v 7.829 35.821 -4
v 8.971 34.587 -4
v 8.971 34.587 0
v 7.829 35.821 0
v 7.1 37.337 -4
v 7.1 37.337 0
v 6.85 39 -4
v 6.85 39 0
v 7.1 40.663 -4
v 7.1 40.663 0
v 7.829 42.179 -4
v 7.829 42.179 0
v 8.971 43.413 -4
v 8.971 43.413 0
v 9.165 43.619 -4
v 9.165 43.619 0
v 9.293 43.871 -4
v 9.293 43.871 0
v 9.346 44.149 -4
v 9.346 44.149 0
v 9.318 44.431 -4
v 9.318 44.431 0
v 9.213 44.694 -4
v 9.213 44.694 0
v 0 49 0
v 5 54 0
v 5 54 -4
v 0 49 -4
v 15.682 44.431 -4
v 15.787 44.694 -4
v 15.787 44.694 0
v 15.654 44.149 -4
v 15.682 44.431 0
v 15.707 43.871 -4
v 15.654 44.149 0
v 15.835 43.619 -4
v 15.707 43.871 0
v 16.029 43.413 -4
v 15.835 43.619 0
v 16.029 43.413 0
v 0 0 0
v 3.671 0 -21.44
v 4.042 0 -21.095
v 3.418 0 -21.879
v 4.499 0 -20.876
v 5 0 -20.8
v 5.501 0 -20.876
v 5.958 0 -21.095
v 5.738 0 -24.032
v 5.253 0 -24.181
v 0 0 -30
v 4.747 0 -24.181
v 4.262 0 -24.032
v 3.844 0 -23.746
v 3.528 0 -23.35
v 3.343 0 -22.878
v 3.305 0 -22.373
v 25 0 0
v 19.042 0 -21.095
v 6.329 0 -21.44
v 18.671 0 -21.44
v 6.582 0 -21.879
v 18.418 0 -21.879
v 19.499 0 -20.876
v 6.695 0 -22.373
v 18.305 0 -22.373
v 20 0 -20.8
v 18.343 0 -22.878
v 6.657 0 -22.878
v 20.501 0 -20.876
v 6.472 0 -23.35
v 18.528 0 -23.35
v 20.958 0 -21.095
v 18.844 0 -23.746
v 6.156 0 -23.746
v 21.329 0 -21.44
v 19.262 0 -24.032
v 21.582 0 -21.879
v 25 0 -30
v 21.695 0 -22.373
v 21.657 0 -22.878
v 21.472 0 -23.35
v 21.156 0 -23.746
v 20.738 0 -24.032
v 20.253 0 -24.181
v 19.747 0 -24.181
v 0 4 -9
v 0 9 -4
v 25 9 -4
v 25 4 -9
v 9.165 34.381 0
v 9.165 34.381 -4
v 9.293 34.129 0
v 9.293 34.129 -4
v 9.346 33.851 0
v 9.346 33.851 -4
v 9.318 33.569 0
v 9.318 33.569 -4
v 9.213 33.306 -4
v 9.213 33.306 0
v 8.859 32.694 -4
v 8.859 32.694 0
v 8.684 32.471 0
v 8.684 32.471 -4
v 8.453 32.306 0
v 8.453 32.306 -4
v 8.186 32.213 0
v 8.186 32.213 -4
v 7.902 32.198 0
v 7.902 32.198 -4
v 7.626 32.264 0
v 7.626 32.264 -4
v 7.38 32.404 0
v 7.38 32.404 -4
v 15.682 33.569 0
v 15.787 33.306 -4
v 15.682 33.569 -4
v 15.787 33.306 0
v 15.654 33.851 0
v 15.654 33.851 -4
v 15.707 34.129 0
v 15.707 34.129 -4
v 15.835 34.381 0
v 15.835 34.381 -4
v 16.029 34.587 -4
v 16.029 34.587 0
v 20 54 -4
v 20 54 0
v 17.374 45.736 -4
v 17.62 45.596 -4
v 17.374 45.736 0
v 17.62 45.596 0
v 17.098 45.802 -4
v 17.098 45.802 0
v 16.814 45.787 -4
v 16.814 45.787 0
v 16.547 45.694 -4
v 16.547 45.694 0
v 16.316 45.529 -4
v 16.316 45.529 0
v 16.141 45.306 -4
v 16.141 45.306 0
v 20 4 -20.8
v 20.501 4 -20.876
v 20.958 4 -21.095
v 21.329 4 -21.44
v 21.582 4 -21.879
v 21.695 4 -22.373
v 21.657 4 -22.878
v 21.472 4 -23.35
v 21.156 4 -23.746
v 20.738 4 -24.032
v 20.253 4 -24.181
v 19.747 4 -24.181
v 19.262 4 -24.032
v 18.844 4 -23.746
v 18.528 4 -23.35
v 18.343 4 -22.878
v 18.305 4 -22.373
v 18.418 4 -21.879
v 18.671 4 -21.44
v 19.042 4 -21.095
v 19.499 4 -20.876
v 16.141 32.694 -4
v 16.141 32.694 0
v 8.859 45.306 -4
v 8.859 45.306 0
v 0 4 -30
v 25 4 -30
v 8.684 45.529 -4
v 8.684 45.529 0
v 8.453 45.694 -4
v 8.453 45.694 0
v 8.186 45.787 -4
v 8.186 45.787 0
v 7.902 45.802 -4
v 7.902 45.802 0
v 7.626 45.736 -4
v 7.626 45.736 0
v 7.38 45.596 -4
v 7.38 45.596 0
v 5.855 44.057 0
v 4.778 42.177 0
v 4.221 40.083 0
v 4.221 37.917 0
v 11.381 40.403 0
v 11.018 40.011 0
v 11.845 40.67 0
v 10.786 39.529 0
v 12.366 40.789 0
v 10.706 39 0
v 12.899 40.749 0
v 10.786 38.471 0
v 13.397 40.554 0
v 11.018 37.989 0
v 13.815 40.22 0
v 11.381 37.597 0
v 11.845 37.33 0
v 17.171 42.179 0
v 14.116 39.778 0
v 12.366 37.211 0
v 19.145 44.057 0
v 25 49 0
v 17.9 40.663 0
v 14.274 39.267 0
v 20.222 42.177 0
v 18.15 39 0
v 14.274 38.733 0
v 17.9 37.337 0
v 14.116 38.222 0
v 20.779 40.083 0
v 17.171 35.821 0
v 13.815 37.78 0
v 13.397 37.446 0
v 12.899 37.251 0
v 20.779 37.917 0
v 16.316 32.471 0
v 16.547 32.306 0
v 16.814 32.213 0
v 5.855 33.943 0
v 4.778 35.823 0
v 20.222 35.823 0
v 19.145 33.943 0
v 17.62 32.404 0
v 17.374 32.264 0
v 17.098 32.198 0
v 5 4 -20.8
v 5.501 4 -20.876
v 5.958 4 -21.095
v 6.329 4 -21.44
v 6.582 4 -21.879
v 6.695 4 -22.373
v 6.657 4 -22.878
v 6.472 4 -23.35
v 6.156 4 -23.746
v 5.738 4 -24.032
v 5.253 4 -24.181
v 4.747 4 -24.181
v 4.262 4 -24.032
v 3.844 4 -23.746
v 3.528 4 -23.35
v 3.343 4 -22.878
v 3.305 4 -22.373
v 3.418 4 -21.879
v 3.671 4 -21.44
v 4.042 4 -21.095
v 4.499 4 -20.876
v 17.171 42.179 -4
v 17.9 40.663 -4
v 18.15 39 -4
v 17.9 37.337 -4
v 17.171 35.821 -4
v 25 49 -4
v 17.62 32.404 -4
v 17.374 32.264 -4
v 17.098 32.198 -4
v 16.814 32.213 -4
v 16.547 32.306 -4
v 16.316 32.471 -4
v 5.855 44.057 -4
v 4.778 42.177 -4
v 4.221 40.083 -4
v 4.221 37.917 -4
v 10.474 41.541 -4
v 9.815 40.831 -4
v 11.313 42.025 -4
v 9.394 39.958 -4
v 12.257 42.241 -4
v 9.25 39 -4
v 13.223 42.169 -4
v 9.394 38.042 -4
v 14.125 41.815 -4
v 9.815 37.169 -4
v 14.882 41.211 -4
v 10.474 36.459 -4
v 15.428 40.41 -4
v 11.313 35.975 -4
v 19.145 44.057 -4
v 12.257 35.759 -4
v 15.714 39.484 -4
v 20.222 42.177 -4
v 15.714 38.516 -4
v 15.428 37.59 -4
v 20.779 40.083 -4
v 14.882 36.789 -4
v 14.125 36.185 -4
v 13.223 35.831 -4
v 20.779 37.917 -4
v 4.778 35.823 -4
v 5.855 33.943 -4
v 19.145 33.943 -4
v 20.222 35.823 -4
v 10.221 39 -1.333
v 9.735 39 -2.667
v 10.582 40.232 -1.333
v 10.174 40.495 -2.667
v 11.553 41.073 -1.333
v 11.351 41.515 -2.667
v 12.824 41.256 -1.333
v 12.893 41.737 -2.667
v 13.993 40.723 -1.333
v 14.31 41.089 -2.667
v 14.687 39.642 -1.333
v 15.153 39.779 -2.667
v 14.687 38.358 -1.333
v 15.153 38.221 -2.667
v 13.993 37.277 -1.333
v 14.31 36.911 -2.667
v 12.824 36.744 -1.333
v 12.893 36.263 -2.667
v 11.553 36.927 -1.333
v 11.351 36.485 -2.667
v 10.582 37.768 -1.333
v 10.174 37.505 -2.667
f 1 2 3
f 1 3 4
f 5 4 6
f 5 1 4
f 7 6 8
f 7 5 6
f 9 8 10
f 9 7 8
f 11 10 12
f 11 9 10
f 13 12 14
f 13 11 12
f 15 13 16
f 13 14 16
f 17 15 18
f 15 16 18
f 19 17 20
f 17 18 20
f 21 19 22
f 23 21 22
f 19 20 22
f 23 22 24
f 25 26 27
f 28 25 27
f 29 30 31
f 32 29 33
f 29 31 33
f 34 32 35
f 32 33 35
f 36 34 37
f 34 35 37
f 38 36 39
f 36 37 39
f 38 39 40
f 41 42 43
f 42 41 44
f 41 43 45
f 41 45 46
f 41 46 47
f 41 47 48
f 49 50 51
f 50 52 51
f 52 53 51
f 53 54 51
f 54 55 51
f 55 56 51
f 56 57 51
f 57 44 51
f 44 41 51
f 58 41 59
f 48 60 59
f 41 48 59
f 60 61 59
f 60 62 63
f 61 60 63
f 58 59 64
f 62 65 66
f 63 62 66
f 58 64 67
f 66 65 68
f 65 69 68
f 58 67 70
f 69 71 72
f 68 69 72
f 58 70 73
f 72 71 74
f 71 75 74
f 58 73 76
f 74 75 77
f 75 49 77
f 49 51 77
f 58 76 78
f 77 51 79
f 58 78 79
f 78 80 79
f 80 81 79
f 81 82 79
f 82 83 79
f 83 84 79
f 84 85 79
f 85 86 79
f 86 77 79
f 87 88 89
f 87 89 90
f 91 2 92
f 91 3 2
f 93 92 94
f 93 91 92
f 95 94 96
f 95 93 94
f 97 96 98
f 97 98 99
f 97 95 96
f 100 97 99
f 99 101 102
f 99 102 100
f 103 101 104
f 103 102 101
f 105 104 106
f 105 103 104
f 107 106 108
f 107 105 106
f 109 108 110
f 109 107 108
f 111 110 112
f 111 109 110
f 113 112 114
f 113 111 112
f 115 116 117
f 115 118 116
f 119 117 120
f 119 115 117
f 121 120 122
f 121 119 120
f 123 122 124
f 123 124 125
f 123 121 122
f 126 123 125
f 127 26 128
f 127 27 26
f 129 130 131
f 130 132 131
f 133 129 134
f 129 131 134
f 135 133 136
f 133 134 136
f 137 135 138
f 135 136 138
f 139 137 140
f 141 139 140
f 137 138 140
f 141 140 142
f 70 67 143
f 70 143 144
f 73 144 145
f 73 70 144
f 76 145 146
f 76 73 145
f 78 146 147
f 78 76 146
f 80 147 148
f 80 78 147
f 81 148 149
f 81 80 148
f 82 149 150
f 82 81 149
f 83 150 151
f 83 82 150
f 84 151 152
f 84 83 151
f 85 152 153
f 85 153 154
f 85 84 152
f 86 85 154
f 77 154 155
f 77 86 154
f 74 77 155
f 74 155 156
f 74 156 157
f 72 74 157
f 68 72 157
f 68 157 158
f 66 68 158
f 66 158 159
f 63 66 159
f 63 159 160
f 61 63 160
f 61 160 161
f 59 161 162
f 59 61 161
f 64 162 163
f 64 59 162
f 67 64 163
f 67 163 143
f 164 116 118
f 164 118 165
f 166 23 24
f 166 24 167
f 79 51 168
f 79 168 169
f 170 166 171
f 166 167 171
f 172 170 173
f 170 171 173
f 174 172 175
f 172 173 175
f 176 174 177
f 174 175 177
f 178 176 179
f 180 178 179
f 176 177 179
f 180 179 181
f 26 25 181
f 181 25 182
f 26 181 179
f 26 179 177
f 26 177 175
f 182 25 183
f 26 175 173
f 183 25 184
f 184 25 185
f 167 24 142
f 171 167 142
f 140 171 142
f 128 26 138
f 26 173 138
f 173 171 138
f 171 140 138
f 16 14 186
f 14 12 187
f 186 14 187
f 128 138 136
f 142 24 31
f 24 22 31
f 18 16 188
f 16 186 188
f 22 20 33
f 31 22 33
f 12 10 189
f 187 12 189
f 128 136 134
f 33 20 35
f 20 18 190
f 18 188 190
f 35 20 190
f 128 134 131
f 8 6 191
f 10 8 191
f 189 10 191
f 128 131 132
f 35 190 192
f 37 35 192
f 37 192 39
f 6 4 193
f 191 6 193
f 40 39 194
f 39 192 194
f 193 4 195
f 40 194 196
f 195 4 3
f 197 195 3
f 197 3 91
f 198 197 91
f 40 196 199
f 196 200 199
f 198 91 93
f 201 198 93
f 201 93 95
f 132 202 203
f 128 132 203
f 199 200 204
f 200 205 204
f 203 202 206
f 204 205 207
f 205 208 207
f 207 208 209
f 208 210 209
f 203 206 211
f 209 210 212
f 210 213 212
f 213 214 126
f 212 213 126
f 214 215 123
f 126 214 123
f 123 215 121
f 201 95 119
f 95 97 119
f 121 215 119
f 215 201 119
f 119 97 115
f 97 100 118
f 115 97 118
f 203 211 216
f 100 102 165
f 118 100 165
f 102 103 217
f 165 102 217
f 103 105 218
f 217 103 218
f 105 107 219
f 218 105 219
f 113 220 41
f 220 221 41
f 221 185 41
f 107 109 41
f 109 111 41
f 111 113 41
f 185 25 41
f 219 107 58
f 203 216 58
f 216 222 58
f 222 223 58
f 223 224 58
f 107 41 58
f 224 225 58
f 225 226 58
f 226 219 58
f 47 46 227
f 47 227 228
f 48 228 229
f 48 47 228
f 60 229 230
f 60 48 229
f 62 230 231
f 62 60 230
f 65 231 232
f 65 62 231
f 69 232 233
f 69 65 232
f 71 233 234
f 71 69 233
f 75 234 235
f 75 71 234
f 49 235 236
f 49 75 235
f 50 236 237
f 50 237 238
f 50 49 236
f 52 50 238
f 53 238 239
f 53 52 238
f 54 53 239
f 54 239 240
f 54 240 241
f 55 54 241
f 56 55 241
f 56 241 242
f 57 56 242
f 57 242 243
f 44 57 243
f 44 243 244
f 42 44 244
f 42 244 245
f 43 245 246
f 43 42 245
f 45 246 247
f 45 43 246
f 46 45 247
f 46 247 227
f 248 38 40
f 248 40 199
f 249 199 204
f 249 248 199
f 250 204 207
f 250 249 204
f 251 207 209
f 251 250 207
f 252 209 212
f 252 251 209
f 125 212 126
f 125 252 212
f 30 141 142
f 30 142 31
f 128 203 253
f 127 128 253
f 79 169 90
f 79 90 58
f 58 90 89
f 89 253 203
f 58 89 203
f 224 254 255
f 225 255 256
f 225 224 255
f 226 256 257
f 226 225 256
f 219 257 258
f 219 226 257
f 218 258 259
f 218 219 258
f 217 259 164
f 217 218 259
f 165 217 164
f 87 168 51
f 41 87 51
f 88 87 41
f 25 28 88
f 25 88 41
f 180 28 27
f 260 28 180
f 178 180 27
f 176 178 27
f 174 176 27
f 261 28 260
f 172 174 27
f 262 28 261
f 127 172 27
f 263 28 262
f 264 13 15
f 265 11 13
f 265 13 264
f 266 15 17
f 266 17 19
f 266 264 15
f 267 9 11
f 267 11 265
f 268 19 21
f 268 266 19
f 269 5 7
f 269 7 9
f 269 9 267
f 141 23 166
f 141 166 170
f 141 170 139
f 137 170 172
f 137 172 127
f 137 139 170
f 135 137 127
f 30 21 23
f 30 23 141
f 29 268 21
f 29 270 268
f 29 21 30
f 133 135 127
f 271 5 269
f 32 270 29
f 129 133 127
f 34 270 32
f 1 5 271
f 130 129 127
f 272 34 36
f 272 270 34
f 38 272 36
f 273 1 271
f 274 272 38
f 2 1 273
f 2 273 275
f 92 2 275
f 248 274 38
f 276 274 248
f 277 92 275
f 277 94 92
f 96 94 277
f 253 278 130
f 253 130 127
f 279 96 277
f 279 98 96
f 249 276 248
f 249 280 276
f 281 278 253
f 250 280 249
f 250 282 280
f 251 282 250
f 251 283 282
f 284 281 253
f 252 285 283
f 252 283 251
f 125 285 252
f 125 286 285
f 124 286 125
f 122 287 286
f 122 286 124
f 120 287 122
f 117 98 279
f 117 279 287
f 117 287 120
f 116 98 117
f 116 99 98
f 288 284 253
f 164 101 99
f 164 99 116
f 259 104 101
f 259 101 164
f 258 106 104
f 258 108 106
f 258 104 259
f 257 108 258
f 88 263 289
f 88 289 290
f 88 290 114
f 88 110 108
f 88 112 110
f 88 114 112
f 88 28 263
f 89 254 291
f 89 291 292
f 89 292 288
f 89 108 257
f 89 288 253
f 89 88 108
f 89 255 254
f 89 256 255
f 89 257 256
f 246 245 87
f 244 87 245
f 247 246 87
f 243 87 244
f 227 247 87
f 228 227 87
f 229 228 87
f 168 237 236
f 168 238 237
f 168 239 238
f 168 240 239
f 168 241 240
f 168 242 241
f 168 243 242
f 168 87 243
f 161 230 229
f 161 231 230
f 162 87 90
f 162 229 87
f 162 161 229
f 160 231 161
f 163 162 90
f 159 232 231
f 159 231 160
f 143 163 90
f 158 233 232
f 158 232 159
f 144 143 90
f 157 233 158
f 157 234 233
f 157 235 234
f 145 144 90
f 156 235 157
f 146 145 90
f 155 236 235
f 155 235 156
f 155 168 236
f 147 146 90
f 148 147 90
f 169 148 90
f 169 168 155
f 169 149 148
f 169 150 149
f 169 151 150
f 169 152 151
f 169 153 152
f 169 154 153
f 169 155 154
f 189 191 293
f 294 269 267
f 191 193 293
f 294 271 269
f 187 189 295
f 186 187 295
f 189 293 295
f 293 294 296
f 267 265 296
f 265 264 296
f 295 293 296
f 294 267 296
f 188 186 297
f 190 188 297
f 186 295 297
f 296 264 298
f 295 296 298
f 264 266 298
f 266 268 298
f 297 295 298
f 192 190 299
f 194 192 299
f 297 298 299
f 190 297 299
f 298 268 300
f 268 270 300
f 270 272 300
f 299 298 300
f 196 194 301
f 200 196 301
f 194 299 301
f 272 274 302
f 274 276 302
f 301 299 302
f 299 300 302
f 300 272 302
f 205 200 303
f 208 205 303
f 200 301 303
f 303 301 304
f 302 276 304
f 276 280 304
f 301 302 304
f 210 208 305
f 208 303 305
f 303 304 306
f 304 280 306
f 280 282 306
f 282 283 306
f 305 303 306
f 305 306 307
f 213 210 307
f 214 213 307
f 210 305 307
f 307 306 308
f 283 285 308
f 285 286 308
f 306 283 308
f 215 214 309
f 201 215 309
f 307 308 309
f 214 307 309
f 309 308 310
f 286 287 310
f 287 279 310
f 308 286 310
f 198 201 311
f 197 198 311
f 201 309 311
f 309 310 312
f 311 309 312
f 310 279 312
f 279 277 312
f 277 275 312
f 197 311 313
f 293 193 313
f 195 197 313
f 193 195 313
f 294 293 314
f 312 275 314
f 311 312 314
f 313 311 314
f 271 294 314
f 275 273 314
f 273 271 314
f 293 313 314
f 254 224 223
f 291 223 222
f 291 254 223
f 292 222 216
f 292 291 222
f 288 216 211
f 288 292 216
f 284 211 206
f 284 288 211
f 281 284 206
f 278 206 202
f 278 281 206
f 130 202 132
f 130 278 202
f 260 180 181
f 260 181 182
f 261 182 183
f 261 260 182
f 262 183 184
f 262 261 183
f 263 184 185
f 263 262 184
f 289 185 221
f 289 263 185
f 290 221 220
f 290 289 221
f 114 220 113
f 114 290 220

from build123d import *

# Parameters (mm, degrees)
SKETCH_2_W          = 25
SKETCH_2_H          = 30
SKETCH_2_R          = 1.7
EXTRUDE_1_DEPTH     = 4
SKETCH_3_W          = 25
SKETCH_3_H          = 4
EXTRUDE_2_DEPTH     = 50
SKETCH_7_R          = 3.25
CUT_EXTRUDE_3_DEPTH = 4
CUT_EXTRUDE_3_DRAFT = -20
CUT_EXTRUDE_4_DEPTH = 65.93843238
EXTRUDE_3_DEPTH     = 25
CHAMFER_1_SIZE      = 5
FILLET_1_R          = 1


with BuildPart() as part:
    # 草图2 → 凸台-拉伸1 (new body)
    with BuildSketch(Plane(origin=(0, 0, 0), x_dir=(1, 0, 0), z_dir=(0, 1, 0))):
        with Locations((12.5, 15)):
            Rectangle(SKETCH_2_W, SKETCH_2_H)
        with Locations(Location((5, 22.5, 0), (0, 0, 270))):
            Circle(SKETCH_2_R, mode=Mode.SUBTRACT)
        with Locations(Location((20, 22.5, 0), (0, 0, 270))):
            Circle(SKETCH_2_R, mode=Mode.SUBTRACT)
    extrude(amount=EXTRUDE_1_DEPTH)

    # 草图3 → 凸台-拉伸2 (add)
    with BuildSketch(Plane(origin=(0, 4, 0), x_dir=(1, 0, 0), z_dir=(0, 1, 0))):
        with Locations((12.5, 2)):
            Rectangle(SKETCH_3_W, SKETCH_3_H)
    extrude(amount=EXTRUDE_2_DEPTH)


with BuildPart() as cut_extrude_3_tool:
    # 草图7 → 切除-拉伸3 (with draft: the straight prism first)
    with BuildSketch(Plane(origin=(0, 0, -4), x_dir=(-1, 0, 0), z_dir=(0, 0, -1))):
        with Locations((-12.5, 39)):
            Circle(SKETCH_7_R)
    extrude(amount=-CUT_EXTRUDE_3_DEPTH)
    # 切除-拉伸3: the draft: its side faces are tilted about the plane it starts from
    cut_extrude_3_sides = [cut_extrude_3_tool.faces().sort_by_distance(p)[0] for p in [
        (15.75, 39, -2),
    ]]
    draft(cut_extrude_3_sides, Plane(origin=(0, 0, -4), x_dir=(-1, 0, 0), z_dir=(0, 0, -1)), CUT_EXTRUDE_3_DRAFT)


with BuildPart() as part_1:
    add(part.part)

    # 切除-拉伸3: cut by cut_extrude_3_tool
    add(cut_extrude_3_tool.part, mode=Mode.SUBTRACT)

    # 草图6 → 切除-拉伸4 (cut, through all)
    with BuildSketch(Plane(origin=(0, 0, -4), x_dir=(-1, 0, 0), z_dir=(0, 0, -1))):
        with BuildLine():
            Line((-16.675, 46.231312122), (-15.325, 43.893043531))
            ThreePointArc((-15.325, 43.893043531), (-18.15, 39), (-15.325, 34.106956469))
            Line((-15.325, 34.106956469), (-16.675, 31.768687878))
            ThreePointArc((-16.675, 31.768687878), (-20.85, 39), (-16.675, 46.231312122))
        make_face()
        with BuildLine():
            Line((-9.675, 43.893043531), (-8.325, 46.231312122))
            ThreePointArc((-8.325, 46.231312122), (-4.15, 39), (-8.325, 31.768687878))
            Line((-8.325, 31.768687878), (-9.675, 34.106956469))
            ThreePointArc((-9.675, 34.106956469), (-6.85, 39), (-9.675, 43.893043531))
        make_face()
    extrude(amount=-CUT_EXTRUDE_4_DEPTH, mode=Mode.SUBTRACT)

    # 草图9 → 凸台-拉伸3 (add)
    with BuildSketch(Plane.ZY):
        Polygon((-9, 4), (-4, 4), (-4, 9), align=None)
    extrude(amount=-EXTRUDE_3_DEPTH)

    # 倒角1
    chamfer_1_edges = [part_1.edges().sort_by_distance(p)[0] for p in [
        (0, 54, -2),
        (25, 54, -2),
    ]]
    chamfer(chamfer_1_edges, length=CHAMFER_1_SIZE)

    # 圆角1
    fillet_1_edges = [part_1.edges().sort_by_distance(p)[0] for p in [
        (9.675, 34.106956469, -2),
        (9.675, 43.893043531, -2),
        (8.325, 46.231312122, -2),
        (8.325, 31.768687878, -2),
        (16.675, 31.768687878, -2),
        (16.675, 46.231312122, -2),
        (15.325, 43.893043531, -2),
        (15.325, 34.106956469, -2),
    ]]
    fillet(fillet_1_edges, radius=FILLET_1_R)


solid = part_1.part
